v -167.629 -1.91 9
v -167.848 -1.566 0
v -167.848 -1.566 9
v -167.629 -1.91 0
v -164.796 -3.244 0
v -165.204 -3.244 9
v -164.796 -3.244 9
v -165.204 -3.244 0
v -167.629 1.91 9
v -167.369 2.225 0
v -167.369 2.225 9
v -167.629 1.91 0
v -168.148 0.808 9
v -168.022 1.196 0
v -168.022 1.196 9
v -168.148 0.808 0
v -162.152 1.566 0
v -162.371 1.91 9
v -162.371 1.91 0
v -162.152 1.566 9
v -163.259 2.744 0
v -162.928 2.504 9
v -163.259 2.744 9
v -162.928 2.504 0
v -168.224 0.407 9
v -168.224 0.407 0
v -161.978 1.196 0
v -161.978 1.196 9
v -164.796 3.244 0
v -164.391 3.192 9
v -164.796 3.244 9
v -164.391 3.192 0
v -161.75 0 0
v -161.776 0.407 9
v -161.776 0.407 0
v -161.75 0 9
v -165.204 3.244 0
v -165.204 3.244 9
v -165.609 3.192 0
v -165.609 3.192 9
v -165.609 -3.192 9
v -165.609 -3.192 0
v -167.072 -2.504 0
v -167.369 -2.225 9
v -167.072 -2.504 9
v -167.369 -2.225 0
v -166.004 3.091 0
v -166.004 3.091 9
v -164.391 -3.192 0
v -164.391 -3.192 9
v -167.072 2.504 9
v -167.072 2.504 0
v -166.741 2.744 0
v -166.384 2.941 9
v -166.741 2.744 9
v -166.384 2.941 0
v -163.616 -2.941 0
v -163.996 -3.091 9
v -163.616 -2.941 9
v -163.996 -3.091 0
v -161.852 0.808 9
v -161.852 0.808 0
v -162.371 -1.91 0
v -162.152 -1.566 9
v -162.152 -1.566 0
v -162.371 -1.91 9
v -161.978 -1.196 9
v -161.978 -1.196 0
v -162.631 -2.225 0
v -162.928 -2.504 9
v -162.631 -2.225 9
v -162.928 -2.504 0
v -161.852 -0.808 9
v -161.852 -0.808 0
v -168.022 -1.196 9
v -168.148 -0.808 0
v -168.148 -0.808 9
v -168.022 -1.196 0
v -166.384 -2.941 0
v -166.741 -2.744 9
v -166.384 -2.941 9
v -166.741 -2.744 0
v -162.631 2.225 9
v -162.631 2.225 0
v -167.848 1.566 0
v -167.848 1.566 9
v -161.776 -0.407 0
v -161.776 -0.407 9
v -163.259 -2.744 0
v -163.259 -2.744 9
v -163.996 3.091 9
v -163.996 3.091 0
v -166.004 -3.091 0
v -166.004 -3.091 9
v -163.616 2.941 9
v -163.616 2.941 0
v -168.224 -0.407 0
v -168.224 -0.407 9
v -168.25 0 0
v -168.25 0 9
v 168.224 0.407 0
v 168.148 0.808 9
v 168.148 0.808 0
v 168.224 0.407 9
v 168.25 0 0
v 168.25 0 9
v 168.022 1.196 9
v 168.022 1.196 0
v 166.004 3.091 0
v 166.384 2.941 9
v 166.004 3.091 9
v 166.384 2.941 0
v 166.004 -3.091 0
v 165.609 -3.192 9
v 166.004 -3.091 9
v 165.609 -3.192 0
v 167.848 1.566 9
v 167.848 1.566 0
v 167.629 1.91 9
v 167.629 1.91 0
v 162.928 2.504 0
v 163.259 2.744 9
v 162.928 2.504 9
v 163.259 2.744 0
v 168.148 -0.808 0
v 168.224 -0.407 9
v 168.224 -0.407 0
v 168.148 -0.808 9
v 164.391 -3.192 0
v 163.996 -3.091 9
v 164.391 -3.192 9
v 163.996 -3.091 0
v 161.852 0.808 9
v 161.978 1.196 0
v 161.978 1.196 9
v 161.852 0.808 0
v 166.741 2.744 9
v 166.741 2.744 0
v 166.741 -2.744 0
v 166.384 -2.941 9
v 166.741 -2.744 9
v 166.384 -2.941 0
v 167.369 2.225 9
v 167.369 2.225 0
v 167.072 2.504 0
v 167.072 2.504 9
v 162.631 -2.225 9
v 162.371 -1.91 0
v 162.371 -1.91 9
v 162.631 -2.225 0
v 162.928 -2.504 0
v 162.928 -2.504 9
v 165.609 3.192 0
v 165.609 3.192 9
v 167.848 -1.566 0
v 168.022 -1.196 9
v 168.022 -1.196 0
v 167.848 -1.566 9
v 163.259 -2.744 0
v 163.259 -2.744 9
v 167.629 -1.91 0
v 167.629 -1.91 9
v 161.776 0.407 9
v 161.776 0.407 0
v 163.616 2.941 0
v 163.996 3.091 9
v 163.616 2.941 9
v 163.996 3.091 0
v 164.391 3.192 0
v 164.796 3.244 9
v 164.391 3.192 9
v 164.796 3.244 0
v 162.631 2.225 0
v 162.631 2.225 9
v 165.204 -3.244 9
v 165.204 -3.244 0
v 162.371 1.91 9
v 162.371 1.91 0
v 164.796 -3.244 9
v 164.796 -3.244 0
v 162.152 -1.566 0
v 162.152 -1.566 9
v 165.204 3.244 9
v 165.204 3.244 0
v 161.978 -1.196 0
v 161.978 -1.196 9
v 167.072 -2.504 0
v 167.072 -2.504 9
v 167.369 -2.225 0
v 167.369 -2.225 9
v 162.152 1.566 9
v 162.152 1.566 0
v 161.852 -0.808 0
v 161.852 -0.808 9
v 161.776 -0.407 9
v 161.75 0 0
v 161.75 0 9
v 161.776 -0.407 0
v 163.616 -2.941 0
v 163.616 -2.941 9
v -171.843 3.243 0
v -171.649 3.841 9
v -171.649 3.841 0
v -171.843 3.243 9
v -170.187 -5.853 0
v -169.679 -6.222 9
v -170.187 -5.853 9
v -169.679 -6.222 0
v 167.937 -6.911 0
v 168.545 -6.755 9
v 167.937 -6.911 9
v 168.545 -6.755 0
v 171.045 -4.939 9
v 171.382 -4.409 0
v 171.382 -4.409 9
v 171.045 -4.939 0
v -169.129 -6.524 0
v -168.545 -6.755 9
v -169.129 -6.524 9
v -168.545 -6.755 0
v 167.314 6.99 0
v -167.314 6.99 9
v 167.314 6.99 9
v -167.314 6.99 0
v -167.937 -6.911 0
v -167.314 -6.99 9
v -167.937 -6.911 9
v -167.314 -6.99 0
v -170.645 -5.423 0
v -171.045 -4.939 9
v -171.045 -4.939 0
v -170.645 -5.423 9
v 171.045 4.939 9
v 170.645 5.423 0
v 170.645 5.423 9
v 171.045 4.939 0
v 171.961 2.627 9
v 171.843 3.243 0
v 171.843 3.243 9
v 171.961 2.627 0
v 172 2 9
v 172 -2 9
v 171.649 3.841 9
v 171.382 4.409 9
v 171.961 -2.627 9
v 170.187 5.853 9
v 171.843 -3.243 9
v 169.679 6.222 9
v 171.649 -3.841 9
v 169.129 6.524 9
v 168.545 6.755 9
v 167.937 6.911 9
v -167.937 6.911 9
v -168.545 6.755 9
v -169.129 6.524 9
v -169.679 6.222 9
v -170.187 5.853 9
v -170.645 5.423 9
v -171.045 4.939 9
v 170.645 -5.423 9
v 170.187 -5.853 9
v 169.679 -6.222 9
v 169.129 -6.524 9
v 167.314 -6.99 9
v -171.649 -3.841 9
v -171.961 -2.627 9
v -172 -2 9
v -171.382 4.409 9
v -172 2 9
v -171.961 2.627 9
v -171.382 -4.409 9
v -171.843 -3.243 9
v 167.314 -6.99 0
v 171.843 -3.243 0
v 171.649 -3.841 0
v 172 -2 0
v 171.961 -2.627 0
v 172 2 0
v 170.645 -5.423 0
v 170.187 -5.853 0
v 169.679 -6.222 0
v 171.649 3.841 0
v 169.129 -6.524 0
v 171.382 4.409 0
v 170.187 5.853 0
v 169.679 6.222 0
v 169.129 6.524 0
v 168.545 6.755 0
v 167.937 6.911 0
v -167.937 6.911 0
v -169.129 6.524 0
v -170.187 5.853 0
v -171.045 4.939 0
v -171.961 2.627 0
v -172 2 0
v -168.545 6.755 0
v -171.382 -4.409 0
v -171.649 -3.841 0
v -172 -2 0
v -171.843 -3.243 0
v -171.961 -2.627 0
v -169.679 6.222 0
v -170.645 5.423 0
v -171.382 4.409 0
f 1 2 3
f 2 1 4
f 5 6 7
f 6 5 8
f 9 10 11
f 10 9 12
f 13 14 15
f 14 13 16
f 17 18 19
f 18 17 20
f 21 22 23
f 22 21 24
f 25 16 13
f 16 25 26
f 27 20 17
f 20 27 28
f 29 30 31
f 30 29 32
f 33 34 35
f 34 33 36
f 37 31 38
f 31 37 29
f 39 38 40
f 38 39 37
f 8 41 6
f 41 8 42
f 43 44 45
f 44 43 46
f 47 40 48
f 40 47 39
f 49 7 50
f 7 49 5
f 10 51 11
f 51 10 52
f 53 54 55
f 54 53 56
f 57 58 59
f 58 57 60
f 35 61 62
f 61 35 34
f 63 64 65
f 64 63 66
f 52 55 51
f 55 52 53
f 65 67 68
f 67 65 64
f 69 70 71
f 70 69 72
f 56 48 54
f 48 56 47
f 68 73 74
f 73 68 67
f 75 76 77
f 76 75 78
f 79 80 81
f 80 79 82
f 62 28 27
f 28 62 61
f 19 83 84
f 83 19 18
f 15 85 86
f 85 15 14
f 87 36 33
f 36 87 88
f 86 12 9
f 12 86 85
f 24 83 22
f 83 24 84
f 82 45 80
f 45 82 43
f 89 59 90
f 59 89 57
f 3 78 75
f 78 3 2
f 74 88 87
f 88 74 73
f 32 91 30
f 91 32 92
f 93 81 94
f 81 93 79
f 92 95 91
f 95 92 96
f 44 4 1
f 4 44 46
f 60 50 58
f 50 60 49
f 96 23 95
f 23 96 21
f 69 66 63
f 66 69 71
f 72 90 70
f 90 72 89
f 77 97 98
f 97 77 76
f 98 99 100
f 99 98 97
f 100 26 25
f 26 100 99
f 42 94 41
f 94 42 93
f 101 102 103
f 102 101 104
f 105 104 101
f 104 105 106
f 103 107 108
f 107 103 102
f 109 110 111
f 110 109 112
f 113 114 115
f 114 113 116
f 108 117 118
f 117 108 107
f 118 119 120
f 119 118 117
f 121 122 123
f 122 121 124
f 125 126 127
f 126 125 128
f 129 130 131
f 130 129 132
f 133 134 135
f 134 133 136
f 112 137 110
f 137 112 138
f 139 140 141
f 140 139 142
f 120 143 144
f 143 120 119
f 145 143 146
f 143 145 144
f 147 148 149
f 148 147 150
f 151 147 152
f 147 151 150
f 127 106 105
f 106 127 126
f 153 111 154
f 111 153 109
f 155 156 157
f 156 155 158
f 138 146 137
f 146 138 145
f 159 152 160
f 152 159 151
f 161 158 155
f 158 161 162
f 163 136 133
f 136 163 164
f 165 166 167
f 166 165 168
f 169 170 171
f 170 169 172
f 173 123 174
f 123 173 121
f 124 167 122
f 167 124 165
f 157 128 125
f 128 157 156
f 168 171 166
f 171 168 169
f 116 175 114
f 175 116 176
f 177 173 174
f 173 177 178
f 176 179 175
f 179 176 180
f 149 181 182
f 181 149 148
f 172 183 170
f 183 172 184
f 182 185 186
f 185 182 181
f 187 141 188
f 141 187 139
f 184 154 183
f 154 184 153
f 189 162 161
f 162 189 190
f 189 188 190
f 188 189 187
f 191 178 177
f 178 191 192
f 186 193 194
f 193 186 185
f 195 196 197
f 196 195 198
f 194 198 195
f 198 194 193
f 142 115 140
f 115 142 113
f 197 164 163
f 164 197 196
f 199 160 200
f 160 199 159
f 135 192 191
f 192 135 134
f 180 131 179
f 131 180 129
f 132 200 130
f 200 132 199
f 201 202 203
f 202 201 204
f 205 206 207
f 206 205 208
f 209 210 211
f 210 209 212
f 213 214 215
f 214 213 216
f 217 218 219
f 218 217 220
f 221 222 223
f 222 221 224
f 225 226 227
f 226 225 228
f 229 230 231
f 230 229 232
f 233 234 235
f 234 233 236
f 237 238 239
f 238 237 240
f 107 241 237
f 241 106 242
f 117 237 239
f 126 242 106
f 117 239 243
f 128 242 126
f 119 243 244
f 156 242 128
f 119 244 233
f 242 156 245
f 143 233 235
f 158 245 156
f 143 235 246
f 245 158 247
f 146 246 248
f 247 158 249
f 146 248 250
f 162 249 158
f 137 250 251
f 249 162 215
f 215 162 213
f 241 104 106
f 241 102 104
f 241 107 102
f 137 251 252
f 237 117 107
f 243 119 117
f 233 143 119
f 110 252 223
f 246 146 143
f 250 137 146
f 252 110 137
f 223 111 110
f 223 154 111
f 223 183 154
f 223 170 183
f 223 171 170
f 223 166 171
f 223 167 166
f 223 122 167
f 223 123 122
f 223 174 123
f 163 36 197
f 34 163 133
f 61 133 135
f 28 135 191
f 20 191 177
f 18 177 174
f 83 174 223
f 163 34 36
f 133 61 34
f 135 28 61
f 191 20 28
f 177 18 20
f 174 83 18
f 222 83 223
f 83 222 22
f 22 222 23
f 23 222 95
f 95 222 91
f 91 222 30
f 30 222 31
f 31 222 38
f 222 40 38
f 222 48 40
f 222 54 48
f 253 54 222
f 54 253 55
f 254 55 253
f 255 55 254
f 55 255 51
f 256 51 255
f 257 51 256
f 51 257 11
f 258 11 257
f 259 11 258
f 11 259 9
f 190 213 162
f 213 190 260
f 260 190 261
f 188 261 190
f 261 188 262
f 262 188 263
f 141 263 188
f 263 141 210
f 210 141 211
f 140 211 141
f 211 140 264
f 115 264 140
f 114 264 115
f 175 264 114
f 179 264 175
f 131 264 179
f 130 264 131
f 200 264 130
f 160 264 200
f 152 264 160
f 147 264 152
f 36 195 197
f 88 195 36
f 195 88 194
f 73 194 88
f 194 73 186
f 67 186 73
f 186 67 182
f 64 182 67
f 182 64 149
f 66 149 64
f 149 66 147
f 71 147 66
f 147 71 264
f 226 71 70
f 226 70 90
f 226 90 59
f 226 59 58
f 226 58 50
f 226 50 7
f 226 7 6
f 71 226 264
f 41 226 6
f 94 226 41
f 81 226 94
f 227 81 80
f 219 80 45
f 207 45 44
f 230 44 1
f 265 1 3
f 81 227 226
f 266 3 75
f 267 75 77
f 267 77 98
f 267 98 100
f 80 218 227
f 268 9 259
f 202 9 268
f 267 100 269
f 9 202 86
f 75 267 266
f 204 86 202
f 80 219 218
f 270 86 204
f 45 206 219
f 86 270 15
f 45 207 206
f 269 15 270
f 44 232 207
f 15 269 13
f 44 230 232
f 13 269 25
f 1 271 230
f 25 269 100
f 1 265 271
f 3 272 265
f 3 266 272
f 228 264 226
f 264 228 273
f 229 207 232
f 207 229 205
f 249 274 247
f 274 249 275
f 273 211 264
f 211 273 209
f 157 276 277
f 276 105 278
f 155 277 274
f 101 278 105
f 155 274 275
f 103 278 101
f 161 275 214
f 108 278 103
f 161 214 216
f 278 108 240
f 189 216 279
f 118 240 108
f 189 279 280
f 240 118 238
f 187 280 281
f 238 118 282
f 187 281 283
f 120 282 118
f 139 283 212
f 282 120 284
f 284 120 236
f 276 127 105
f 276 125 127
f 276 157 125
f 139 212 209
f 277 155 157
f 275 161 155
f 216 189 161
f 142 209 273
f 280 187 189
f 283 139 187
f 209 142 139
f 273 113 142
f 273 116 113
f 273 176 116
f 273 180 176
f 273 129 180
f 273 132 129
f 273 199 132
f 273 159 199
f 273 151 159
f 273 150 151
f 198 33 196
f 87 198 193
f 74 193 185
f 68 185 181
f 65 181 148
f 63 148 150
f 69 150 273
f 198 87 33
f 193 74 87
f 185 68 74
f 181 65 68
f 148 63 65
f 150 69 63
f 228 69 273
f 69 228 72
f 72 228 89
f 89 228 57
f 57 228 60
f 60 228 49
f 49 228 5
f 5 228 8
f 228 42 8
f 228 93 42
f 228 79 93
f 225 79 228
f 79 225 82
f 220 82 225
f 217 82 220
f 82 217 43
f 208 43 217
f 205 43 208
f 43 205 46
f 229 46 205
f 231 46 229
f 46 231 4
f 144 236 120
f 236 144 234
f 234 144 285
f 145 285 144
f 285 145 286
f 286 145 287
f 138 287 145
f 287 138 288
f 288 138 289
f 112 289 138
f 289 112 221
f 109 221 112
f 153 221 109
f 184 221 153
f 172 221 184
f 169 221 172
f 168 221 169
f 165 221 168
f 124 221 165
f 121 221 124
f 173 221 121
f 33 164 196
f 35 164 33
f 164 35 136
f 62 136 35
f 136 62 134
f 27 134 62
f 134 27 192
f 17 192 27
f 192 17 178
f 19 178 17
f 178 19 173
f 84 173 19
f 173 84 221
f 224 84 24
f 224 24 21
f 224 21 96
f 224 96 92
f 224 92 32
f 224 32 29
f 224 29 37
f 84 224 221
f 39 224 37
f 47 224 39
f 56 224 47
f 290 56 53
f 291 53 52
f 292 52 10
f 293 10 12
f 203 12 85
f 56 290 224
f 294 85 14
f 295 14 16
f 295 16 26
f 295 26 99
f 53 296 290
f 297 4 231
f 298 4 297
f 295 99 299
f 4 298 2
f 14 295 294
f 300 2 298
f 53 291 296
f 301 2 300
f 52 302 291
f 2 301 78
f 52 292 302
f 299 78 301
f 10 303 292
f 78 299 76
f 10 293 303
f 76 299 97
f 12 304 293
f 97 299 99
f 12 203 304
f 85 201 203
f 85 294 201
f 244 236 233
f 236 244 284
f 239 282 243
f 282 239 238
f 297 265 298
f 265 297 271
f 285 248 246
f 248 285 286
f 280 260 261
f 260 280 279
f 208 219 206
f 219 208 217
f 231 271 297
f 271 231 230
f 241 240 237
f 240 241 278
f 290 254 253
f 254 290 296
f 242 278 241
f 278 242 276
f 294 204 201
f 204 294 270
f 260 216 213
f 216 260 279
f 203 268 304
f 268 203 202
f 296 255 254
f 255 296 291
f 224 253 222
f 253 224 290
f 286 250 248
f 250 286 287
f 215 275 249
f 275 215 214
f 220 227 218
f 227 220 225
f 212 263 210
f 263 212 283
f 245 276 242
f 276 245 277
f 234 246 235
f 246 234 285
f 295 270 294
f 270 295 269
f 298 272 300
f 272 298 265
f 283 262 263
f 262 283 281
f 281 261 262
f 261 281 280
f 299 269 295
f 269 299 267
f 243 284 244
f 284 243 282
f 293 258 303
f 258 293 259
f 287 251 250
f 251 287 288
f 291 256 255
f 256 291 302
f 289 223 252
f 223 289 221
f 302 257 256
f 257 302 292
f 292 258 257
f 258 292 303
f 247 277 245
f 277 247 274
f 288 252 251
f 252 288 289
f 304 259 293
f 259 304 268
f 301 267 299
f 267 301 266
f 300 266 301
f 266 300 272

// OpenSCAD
$fn = 50;


difference() {
	union() {
		hull() {
			translate(v = [-167.0000000000, 2.0000000000, 0]) {
				cylinder(h = 9, r = 5);
			}
			translate(v = [167.0000000000, 2.0000000000, 0]) {
				cylinder(h = 9, r = 5);
			}
			translate(v = [-167.0000000000, -2.0000000000, 0]) {
				cylinder(h = 9, r = 5);
			}
			translate(v = [167.0000000000, -2.0000000000, 0]) {
				cylinder(h = 9, r = 5);
			}
		}
	}
	union() {
		translate(v = [-165.0000000000, 0.0000000000, -100.0000000000]) {
			cylinder(h = 200, r = 3.2500000000);
		}
		translate(v = [-165.0000000000, 0.0000000000, -100.0000000000]) {
			cylinder(h = 200, r = 3.2500000000);
		}
		translate(v = [165.0000000000, 0.0000000000, -100.0000000000]) {
			cylinder(h = 200, r = 3.2500000000);
		}
		translate(v = [165.0000000000, 0.0000000000, -100.0000000000]) {
			cylinder(h = 200, r = 3.2500000000);
		}
	}
}
